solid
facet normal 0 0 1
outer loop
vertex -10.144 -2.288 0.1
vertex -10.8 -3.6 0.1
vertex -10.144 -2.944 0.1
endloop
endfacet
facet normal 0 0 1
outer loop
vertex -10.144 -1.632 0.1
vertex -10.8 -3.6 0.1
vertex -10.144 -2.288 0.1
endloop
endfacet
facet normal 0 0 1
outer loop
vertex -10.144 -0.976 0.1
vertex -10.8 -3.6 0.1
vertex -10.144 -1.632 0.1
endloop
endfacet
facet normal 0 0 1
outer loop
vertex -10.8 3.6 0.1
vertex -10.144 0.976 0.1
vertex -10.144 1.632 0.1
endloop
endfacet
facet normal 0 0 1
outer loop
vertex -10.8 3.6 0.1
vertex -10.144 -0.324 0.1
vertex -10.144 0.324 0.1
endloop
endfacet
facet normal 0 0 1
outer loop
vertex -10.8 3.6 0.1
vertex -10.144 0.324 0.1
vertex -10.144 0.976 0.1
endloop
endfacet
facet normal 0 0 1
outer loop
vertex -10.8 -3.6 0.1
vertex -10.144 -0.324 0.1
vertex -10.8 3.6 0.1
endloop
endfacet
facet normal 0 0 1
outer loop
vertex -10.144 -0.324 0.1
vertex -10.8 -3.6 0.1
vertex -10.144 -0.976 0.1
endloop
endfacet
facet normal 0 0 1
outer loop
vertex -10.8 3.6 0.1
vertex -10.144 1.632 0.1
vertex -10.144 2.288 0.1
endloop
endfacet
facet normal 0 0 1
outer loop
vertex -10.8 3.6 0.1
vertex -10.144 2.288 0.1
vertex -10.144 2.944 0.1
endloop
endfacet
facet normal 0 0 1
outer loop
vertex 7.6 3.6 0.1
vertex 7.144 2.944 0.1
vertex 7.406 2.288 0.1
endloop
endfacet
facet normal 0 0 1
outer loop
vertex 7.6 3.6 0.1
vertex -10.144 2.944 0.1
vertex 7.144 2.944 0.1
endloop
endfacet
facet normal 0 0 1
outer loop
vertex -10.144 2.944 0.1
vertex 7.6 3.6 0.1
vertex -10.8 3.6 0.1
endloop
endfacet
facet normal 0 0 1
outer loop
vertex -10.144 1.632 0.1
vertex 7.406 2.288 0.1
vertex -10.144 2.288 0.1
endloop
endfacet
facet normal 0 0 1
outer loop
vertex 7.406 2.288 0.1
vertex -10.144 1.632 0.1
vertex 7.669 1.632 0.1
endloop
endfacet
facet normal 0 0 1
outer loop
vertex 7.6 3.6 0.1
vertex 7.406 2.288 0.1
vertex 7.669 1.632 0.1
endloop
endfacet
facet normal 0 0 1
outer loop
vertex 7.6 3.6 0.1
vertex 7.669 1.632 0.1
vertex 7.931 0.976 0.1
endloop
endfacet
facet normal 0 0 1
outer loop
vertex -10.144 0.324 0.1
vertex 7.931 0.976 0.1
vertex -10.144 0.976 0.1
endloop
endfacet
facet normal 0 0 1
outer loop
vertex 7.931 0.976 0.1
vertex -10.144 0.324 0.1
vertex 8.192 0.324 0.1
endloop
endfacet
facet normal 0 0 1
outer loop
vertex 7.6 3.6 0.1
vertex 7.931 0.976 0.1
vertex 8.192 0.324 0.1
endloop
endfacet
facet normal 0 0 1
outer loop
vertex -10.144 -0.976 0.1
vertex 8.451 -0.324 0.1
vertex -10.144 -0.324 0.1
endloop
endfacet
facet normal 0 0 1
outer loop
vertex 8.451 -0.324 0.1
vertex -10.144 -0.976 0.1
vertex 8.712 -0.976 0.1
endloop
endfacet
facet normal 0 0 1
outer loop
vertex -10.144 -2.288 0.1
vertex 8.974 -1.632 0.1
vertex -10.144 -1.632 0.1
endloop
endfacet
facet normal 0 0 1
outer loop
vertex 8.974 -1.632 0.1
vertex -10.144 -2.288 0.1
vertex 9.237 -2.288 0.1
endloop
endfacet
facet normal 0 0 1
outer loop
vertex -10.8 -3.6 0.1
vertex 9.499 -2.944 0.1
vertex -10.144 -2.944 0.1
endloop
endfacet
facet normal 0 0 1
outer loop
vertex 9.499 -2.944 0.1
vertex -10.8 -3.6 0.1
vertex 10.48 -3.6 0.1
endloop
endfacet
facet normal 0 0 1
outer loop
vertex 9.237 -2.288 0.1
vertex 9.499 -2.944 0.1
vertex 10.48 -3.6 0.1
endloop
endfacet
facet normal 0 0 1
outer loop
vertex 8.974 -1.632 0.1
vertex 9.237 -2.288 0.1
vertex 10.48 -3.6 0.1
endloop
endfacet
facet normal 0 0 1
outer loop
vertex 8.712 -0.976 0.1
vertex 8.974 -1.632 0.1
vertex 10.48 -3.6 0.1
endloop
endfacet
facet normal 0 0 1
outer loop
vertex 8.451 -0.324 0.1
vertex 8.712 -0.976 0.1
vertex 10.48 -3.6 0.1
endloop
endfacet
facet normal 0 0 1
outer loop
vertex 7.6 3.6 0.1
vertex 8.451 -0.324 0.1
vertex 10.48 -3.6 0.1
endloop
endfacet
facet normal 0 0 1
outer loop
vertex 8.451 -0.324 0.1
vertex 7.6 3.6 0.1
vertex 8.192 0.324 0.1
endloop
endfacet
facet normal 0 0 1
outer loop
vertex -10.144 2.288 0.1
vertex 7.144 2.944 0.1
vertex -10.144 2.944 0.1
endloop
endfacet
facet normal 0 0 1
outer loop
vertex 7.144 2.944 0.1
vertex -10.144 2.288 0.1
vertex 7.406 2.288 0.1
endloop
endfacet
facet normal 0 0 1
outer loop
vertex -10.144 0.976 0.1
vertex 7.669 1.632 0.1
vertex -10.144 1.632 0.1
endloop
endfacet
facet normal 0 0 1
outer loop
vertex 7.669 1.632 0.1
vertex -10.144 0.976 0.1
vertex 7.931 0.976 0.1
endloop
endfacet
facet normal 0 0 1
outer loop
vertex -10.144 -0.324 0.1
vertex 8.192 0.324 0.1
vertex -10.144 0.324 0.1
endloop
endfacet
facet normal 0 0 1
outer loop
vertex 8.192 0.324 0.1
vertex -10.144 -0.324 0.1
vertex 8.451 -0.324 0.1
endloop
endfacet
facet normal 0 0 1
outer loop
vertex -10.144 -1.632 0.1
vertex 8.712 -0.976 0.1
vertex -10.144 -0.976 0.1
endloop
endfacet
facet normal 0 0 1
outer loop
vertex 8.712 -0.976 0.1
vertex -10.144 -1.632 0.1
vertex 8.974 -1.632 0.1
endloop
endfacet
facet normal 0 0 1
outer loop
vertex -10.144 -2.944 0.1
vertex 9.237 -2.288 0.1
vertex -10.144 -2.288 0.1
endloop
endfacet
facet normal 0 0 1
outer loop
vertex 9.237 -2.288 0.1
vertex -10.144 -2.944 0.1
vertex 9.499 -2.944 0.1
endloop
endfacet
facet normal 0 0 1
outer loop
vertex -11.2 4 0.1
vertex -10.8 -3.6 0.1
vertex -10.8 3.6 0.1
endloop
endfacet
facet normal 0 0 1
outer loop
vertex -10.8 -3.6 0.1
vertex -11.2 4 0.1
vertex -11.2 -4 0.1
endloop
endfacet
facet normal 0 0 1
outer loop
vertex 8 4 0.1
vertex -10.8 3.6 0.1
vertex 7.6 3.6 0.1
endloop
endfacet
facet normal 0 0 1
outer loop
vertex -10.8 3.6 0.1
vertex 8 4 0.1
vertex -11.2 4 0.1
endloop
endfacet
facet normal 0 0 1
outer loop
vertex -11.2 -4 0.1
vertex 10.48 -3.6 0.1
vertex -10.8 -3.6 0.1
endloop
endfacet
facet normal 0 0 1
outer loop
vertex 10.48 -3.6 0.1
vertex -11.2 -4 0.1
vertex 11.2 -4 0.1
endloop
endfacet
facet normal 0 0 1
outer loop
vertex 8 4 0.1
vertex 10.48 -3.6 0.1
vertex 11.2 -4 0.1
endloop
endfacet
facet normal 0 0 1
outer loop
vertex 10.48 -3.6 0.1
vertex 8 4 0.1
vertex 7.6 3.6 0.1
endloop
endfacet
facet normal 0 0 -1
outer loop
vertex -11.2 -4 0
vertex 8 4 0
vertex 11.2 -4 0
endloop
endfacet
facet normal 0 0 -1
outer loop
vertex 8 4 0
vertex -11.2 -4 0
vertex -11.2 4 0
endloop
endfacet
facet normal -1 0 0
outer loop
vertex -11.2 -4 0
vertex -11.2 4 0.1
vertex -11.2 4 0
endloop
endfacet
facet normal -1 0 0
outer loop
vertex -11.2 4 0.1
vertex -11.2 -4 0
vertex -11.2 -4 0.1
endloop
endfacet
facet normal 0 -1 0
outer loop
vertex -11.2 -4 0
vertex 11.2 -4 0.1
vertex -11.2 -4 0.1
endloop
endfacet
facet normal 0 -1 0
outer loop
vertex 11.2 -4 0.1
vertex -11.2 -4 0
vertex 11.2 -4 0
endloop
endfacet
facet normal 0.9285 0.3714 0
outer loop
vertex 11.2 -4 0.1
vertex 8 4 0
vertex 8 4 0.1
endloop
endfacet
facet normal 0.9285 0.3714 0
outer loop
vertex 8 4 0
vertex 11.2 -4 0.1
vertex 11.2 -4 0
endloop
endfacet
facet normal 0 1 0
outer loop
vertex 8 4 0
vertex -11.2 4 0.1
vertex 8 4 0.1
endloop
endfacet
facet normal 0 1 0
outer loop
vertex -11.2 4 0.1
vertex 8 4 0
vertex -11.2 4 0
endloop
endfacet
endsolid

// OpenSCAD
use <../lib.scad>
function ldraw_lib__821472h() = [
// 0 Sticker  1.0 x  2.8 with Black and Light Grey Grid on Transparent Background (Right)
// 0 Name: 821472h.dat
// 0 Author: Damien Roux [Darats]
// 0 !LDRAW_ORG Part UPDATE 2015-02
// 0 !LICENSE Licensed under CC BY 2.0 and CC BY 4.0 : see CAreadme.txt
// 
// 0 BFC CERTIFY CCW
  [0,"BFC","CERTIFY"],
  [0,"BFC","CCW"],
// 
// 0 !KEYWORDS Set 5521
// 
// 0 !HISTORY 2015-12-30 [PTadmin] Official Update 2015-02
// 
// 
// 3 0 -25.36 -.25 -5.72 -27 -.25 -9 -25.36 -.25 -7.36
  [3,0,-25.36,-.25,-5.72,-27,-.25,-9,-25.36,-.25,-7.36],
// 3 0 -25.36 -.25 -4.08 -27 -.25 -9 -25.36 -.25 -5.72
  [3,0,-25.36,-.25,-4.08,-27,-.25,-9,-25.36,-.25,-5.72],
// 3 0 -25.36 -.25 -2.44 -27 -.25 -9 -25.36 -.25 -4.08
  [3,0,-25.36,-.25,-2.44,-27,-.25,-9,-25.36,-.25,-4.08],
// 3 0 -27 -.25 9 -25.36 -.25 2.44 -25.36 -.25 4.08
  [3,0,-27,-.25,9,-25.36,-.25,2.44,-25.36,-.25,4.08],
// 3 0 -27 -.25 9 -25.36 -.25 -.81 -25.36 -.25 .81
  [3,0,-27,-.25,9,-25.36,-.25,-.81,-25.36,-.25,.81],
// 3 0 -27 -.25 9 -25.36 -.25 .81 -25.36 -.25 2.44
  [3,0,-27,-.25,9,-25.36,-.25,.81,-25.36,-.25,2.44],
// 4 0 -27 -.25 -9 -25.36 -.25 -2.44 -25.36 -.25 -.81 -27 -.25 9
  [4,0,-27,-.25,-9,-25.36,-.25,-2.44,-25.36,-.25,-.81,-27,-.25,9],
// 3 0 -27 -.25 9 -25.36 -.25 4.08 -25.36 -.25 5.72
  [3,0,-27,-.25,9,-25.36,-.25,4.08,-25.36,-.25,5.72],
// 3 0 -27 -.25 9 -25.36 -.25 5.72 -25.36 -.25 7.36
  [3,0,-27,-.25,9,-25.36,-.25,5.72,-25.36,-.25,7.36],
// 3 0 19 -.25 9 17.86 -.25 7.36 18.516 -.25 5.72
  [3,0,19,-.25,9,17.86,-.25,7.36,18.516,-.25,5.72],
// 4 0 -25.36 -.25 7.36 17.86 -.25 7.36 19 -.25 9 -27 -.25 9
  [4,0,-25.36,-.25,7.36,17.86,-.25,7.36,19,-.25,9,-27,-.25,9],
// 4 0 18.516 -.25 5.72 -25.36 -.25 5.72 -25.36 -.25 4.08 19.172 -.25 4.08
  [4,0,18.516,-.25,5.72,-25.36,-.25,5.72,-25.36,-.25,4.08,19.172,-.25,4.08],
// 3 0 19 -.25 9 18.516 -.25 5.72 19.172 -.25 4.08
  [3,0,19,-.25,9,18.516,-.25,5.72,19.172,-.25,4.08],
// 3 0 19 -.25 9 19.172 -.25 4.08 19.828 -.25 2.44
  [3,0,19,-.25,9,19.172,-.25,4.08,19.828,-.25,2.44],
// 4 0 19.828 -.25 2.44 -25.36 -.25 2.44 -25.36 -.25 .81 20.48 -.25 .81
  [4,0,19.828,-.25,2.44,-25.36,-.25,2.44,-25.36,-.25,.81,20.48,-.25,.81],
// 3 0 19 -.25 9 19.828 -.25 2.44 20.48 -.25 .81
  [3,0,19,-.25,9,19.828,-.25,2.44,20.48,-.25,.81],
// 4 0 21.128 -.25 -.81 -25.36 -.25 -.81 -25.36 -.25 -2.44 21.78 -.25 -2.44
  [4,0,21.128,-.25,-.81,-25.36,-.25,-.81,-25.36,-.25,-2.44,21.78,-.25,-2.44],
// 4 0 22.436 -.25 -4.08 -25.36 -.25 -4.08 -25.36 -.25 -5.72 23.092 -.25 -5.72
  [4,0,22.436,-.25,-4.08,-25.36,-.25,-4.08,-25.36,-.25,-5.72,23.092,-.25,-5.72],
// 4 0 23.748 -.25 -7.36 -25.36 -.25 -7.36 -27 -.25 -9 26.2 -.25 -9
  [4,0,23.748,-.25,-7.36,-25.36,-.25,-7.36,-27,-.25,-9,26.2,-.25,-9],
// 3 0 23.092 -.25 -5.72 23.748 -.25 -7.36 26.2 -.25 -9
  [3,0,23.092,-.25,-5.72,23.748,-.25,-7.36,26.2,-.25,-9],
// 3 0 22.436 -.25 -4.08 23.092 -.25 -5.72 26.2 -.25 -9
  [3,0,22.436,-.25,-4.08,23.092,-.25,-5.72,26.2,-.25,-9],
// 3 0 21.78 -.25 -2.44 22.436 -.25 -4.08 26.2 -.25 -9
  [3,0,21.78,-.25,-2.44,22.436,-.25,-4.08,26.2,-.25,-9],
// 3 0 21.128 -.25 -.81 21.78 -.25 -2.44 26.2 -.25 -9
  [3,0,21.128,-.25,-.81,21.78,-.25,-2.44,26.2,-.25,-9],
// 4 0 19 -.25 9 20.48 -.25 .81 21.128 -.25 -.81 26.2 -.25 -9
  [4,0,19,-.25,9,20.48,-.25,.81,21.128,-.25,-.81,26.2,-.25,-9],
// 4 7 17.86 -.25 7.36 -25.36 -.25 7.36 -25.36 -.25 5.72 18.516 -.25 5.72
  [4,7,17.86,-.25,7.36,-25.36,-.25,7.36,-25.36,-.25,5.72,18.516,-.25,5.72],
// 4 7 19.172 -.25 4.08 -25.36 -.25 4.08 -25.36 -.25 2.44 19.828 -.25 2.44
  [4,7,19.172,-.25,4.08,-25.36,-.25,4.08,-25.36,-.25,2.44,19.828,-.25,2.44],
// 4 7 20.48 -.25 .81 -25.36 -.25 .81 -25.36 -.25 -.81 21.128 -.25 -.81
  [4,7,20.48,-.25,.81,-25.36,-.25,.81,-25.36,-.25,-.81,21.128,-.25,-.81],
// 4 7 21.78 -.25 -2.44 -25.36 -.25 -2.44 -25.36 -.25 -4.08 22.436 -.25 -4.08
  [4,7,21.78,-.25,-2.44,-25.36,-.25,-2.44,-25.36,-.25,-4.08,22.436,-.25,-4.08],
// 4 7 23.092 -.25 -5.72 -25.36 -.25 -5.72 -25.36 -.25 -7.36 23.748 -.25 -7.36
  [4,7,23.092,-.25,-5.72,-25.36,-.25,-5.72,-25.36,-.25,-7.36,23.748,-.25,-7.36],
// 4 16 -27 -.25 9 -28 -.25 10 -28 -.25 -10 -27 -.25 -9
  [4,16,-27,-.25,9,-28,-.25,10,-28,-.25,-10,-27,-.25,-9],
// 4 16 19 -.25 9 20 -.25 10 -28 -.25 10 -27 -.25 9
  [4,16,19,-.25,9,20,-.25,10,-28,-.25,10,-27,-.25,9],
// 4 16 26.2 -.25 -9 -27 -.25 -9 -28 -.25 -10 28 -.25 -10
  [4,16,26.2,-.25,-9,-27,-.25,-9,-28,-.25,-10,28,-.25,-10],
// 4 16 26.2 -.25 -9 28 -.25 -10 20 -.25 10 19 -.25 9
  [4,16,26.2,-.25,-9,28,-.25,-10,20,-.25,10,19,-.25,9],
// 
// 4 16 -28 0 10 20 0 10 28 0 -10 -28 0 -10
  [4,16,-28,0,10,20,0,10,28,0,-10,-28,0,-10],
// 4 16 -28 -.25 10 -28 0 10 -28 0 -10 -28 -.25 -10
  [4,16,-28,-.25,10,-28,0,10,-28,0,-10,-28,-.25,-10],
// 4 16 -28 -.25 -10 -28 0 -10 28 0 -10 28 -.25 -10
  [4,16,-28,-.25,-10,-28,0,-10,28,0,-10,28,-.25,-10],
// 4 16 28 0 -10 20 0 10 20 -.25 10 28 -.25 -10
  [4,16,28,0,-10,20,0,10,20,-.25,10,28,-.25,-10],
// 4 16 20 0 10 -28 0 10 -28 -.25 10 20 -.25 10
  [4,16,20,0,10,-28,0,10,-28,-.25,10,20,-.25,10],
];
makepoly(ldraw_lib__821472h(), line=0.2);
